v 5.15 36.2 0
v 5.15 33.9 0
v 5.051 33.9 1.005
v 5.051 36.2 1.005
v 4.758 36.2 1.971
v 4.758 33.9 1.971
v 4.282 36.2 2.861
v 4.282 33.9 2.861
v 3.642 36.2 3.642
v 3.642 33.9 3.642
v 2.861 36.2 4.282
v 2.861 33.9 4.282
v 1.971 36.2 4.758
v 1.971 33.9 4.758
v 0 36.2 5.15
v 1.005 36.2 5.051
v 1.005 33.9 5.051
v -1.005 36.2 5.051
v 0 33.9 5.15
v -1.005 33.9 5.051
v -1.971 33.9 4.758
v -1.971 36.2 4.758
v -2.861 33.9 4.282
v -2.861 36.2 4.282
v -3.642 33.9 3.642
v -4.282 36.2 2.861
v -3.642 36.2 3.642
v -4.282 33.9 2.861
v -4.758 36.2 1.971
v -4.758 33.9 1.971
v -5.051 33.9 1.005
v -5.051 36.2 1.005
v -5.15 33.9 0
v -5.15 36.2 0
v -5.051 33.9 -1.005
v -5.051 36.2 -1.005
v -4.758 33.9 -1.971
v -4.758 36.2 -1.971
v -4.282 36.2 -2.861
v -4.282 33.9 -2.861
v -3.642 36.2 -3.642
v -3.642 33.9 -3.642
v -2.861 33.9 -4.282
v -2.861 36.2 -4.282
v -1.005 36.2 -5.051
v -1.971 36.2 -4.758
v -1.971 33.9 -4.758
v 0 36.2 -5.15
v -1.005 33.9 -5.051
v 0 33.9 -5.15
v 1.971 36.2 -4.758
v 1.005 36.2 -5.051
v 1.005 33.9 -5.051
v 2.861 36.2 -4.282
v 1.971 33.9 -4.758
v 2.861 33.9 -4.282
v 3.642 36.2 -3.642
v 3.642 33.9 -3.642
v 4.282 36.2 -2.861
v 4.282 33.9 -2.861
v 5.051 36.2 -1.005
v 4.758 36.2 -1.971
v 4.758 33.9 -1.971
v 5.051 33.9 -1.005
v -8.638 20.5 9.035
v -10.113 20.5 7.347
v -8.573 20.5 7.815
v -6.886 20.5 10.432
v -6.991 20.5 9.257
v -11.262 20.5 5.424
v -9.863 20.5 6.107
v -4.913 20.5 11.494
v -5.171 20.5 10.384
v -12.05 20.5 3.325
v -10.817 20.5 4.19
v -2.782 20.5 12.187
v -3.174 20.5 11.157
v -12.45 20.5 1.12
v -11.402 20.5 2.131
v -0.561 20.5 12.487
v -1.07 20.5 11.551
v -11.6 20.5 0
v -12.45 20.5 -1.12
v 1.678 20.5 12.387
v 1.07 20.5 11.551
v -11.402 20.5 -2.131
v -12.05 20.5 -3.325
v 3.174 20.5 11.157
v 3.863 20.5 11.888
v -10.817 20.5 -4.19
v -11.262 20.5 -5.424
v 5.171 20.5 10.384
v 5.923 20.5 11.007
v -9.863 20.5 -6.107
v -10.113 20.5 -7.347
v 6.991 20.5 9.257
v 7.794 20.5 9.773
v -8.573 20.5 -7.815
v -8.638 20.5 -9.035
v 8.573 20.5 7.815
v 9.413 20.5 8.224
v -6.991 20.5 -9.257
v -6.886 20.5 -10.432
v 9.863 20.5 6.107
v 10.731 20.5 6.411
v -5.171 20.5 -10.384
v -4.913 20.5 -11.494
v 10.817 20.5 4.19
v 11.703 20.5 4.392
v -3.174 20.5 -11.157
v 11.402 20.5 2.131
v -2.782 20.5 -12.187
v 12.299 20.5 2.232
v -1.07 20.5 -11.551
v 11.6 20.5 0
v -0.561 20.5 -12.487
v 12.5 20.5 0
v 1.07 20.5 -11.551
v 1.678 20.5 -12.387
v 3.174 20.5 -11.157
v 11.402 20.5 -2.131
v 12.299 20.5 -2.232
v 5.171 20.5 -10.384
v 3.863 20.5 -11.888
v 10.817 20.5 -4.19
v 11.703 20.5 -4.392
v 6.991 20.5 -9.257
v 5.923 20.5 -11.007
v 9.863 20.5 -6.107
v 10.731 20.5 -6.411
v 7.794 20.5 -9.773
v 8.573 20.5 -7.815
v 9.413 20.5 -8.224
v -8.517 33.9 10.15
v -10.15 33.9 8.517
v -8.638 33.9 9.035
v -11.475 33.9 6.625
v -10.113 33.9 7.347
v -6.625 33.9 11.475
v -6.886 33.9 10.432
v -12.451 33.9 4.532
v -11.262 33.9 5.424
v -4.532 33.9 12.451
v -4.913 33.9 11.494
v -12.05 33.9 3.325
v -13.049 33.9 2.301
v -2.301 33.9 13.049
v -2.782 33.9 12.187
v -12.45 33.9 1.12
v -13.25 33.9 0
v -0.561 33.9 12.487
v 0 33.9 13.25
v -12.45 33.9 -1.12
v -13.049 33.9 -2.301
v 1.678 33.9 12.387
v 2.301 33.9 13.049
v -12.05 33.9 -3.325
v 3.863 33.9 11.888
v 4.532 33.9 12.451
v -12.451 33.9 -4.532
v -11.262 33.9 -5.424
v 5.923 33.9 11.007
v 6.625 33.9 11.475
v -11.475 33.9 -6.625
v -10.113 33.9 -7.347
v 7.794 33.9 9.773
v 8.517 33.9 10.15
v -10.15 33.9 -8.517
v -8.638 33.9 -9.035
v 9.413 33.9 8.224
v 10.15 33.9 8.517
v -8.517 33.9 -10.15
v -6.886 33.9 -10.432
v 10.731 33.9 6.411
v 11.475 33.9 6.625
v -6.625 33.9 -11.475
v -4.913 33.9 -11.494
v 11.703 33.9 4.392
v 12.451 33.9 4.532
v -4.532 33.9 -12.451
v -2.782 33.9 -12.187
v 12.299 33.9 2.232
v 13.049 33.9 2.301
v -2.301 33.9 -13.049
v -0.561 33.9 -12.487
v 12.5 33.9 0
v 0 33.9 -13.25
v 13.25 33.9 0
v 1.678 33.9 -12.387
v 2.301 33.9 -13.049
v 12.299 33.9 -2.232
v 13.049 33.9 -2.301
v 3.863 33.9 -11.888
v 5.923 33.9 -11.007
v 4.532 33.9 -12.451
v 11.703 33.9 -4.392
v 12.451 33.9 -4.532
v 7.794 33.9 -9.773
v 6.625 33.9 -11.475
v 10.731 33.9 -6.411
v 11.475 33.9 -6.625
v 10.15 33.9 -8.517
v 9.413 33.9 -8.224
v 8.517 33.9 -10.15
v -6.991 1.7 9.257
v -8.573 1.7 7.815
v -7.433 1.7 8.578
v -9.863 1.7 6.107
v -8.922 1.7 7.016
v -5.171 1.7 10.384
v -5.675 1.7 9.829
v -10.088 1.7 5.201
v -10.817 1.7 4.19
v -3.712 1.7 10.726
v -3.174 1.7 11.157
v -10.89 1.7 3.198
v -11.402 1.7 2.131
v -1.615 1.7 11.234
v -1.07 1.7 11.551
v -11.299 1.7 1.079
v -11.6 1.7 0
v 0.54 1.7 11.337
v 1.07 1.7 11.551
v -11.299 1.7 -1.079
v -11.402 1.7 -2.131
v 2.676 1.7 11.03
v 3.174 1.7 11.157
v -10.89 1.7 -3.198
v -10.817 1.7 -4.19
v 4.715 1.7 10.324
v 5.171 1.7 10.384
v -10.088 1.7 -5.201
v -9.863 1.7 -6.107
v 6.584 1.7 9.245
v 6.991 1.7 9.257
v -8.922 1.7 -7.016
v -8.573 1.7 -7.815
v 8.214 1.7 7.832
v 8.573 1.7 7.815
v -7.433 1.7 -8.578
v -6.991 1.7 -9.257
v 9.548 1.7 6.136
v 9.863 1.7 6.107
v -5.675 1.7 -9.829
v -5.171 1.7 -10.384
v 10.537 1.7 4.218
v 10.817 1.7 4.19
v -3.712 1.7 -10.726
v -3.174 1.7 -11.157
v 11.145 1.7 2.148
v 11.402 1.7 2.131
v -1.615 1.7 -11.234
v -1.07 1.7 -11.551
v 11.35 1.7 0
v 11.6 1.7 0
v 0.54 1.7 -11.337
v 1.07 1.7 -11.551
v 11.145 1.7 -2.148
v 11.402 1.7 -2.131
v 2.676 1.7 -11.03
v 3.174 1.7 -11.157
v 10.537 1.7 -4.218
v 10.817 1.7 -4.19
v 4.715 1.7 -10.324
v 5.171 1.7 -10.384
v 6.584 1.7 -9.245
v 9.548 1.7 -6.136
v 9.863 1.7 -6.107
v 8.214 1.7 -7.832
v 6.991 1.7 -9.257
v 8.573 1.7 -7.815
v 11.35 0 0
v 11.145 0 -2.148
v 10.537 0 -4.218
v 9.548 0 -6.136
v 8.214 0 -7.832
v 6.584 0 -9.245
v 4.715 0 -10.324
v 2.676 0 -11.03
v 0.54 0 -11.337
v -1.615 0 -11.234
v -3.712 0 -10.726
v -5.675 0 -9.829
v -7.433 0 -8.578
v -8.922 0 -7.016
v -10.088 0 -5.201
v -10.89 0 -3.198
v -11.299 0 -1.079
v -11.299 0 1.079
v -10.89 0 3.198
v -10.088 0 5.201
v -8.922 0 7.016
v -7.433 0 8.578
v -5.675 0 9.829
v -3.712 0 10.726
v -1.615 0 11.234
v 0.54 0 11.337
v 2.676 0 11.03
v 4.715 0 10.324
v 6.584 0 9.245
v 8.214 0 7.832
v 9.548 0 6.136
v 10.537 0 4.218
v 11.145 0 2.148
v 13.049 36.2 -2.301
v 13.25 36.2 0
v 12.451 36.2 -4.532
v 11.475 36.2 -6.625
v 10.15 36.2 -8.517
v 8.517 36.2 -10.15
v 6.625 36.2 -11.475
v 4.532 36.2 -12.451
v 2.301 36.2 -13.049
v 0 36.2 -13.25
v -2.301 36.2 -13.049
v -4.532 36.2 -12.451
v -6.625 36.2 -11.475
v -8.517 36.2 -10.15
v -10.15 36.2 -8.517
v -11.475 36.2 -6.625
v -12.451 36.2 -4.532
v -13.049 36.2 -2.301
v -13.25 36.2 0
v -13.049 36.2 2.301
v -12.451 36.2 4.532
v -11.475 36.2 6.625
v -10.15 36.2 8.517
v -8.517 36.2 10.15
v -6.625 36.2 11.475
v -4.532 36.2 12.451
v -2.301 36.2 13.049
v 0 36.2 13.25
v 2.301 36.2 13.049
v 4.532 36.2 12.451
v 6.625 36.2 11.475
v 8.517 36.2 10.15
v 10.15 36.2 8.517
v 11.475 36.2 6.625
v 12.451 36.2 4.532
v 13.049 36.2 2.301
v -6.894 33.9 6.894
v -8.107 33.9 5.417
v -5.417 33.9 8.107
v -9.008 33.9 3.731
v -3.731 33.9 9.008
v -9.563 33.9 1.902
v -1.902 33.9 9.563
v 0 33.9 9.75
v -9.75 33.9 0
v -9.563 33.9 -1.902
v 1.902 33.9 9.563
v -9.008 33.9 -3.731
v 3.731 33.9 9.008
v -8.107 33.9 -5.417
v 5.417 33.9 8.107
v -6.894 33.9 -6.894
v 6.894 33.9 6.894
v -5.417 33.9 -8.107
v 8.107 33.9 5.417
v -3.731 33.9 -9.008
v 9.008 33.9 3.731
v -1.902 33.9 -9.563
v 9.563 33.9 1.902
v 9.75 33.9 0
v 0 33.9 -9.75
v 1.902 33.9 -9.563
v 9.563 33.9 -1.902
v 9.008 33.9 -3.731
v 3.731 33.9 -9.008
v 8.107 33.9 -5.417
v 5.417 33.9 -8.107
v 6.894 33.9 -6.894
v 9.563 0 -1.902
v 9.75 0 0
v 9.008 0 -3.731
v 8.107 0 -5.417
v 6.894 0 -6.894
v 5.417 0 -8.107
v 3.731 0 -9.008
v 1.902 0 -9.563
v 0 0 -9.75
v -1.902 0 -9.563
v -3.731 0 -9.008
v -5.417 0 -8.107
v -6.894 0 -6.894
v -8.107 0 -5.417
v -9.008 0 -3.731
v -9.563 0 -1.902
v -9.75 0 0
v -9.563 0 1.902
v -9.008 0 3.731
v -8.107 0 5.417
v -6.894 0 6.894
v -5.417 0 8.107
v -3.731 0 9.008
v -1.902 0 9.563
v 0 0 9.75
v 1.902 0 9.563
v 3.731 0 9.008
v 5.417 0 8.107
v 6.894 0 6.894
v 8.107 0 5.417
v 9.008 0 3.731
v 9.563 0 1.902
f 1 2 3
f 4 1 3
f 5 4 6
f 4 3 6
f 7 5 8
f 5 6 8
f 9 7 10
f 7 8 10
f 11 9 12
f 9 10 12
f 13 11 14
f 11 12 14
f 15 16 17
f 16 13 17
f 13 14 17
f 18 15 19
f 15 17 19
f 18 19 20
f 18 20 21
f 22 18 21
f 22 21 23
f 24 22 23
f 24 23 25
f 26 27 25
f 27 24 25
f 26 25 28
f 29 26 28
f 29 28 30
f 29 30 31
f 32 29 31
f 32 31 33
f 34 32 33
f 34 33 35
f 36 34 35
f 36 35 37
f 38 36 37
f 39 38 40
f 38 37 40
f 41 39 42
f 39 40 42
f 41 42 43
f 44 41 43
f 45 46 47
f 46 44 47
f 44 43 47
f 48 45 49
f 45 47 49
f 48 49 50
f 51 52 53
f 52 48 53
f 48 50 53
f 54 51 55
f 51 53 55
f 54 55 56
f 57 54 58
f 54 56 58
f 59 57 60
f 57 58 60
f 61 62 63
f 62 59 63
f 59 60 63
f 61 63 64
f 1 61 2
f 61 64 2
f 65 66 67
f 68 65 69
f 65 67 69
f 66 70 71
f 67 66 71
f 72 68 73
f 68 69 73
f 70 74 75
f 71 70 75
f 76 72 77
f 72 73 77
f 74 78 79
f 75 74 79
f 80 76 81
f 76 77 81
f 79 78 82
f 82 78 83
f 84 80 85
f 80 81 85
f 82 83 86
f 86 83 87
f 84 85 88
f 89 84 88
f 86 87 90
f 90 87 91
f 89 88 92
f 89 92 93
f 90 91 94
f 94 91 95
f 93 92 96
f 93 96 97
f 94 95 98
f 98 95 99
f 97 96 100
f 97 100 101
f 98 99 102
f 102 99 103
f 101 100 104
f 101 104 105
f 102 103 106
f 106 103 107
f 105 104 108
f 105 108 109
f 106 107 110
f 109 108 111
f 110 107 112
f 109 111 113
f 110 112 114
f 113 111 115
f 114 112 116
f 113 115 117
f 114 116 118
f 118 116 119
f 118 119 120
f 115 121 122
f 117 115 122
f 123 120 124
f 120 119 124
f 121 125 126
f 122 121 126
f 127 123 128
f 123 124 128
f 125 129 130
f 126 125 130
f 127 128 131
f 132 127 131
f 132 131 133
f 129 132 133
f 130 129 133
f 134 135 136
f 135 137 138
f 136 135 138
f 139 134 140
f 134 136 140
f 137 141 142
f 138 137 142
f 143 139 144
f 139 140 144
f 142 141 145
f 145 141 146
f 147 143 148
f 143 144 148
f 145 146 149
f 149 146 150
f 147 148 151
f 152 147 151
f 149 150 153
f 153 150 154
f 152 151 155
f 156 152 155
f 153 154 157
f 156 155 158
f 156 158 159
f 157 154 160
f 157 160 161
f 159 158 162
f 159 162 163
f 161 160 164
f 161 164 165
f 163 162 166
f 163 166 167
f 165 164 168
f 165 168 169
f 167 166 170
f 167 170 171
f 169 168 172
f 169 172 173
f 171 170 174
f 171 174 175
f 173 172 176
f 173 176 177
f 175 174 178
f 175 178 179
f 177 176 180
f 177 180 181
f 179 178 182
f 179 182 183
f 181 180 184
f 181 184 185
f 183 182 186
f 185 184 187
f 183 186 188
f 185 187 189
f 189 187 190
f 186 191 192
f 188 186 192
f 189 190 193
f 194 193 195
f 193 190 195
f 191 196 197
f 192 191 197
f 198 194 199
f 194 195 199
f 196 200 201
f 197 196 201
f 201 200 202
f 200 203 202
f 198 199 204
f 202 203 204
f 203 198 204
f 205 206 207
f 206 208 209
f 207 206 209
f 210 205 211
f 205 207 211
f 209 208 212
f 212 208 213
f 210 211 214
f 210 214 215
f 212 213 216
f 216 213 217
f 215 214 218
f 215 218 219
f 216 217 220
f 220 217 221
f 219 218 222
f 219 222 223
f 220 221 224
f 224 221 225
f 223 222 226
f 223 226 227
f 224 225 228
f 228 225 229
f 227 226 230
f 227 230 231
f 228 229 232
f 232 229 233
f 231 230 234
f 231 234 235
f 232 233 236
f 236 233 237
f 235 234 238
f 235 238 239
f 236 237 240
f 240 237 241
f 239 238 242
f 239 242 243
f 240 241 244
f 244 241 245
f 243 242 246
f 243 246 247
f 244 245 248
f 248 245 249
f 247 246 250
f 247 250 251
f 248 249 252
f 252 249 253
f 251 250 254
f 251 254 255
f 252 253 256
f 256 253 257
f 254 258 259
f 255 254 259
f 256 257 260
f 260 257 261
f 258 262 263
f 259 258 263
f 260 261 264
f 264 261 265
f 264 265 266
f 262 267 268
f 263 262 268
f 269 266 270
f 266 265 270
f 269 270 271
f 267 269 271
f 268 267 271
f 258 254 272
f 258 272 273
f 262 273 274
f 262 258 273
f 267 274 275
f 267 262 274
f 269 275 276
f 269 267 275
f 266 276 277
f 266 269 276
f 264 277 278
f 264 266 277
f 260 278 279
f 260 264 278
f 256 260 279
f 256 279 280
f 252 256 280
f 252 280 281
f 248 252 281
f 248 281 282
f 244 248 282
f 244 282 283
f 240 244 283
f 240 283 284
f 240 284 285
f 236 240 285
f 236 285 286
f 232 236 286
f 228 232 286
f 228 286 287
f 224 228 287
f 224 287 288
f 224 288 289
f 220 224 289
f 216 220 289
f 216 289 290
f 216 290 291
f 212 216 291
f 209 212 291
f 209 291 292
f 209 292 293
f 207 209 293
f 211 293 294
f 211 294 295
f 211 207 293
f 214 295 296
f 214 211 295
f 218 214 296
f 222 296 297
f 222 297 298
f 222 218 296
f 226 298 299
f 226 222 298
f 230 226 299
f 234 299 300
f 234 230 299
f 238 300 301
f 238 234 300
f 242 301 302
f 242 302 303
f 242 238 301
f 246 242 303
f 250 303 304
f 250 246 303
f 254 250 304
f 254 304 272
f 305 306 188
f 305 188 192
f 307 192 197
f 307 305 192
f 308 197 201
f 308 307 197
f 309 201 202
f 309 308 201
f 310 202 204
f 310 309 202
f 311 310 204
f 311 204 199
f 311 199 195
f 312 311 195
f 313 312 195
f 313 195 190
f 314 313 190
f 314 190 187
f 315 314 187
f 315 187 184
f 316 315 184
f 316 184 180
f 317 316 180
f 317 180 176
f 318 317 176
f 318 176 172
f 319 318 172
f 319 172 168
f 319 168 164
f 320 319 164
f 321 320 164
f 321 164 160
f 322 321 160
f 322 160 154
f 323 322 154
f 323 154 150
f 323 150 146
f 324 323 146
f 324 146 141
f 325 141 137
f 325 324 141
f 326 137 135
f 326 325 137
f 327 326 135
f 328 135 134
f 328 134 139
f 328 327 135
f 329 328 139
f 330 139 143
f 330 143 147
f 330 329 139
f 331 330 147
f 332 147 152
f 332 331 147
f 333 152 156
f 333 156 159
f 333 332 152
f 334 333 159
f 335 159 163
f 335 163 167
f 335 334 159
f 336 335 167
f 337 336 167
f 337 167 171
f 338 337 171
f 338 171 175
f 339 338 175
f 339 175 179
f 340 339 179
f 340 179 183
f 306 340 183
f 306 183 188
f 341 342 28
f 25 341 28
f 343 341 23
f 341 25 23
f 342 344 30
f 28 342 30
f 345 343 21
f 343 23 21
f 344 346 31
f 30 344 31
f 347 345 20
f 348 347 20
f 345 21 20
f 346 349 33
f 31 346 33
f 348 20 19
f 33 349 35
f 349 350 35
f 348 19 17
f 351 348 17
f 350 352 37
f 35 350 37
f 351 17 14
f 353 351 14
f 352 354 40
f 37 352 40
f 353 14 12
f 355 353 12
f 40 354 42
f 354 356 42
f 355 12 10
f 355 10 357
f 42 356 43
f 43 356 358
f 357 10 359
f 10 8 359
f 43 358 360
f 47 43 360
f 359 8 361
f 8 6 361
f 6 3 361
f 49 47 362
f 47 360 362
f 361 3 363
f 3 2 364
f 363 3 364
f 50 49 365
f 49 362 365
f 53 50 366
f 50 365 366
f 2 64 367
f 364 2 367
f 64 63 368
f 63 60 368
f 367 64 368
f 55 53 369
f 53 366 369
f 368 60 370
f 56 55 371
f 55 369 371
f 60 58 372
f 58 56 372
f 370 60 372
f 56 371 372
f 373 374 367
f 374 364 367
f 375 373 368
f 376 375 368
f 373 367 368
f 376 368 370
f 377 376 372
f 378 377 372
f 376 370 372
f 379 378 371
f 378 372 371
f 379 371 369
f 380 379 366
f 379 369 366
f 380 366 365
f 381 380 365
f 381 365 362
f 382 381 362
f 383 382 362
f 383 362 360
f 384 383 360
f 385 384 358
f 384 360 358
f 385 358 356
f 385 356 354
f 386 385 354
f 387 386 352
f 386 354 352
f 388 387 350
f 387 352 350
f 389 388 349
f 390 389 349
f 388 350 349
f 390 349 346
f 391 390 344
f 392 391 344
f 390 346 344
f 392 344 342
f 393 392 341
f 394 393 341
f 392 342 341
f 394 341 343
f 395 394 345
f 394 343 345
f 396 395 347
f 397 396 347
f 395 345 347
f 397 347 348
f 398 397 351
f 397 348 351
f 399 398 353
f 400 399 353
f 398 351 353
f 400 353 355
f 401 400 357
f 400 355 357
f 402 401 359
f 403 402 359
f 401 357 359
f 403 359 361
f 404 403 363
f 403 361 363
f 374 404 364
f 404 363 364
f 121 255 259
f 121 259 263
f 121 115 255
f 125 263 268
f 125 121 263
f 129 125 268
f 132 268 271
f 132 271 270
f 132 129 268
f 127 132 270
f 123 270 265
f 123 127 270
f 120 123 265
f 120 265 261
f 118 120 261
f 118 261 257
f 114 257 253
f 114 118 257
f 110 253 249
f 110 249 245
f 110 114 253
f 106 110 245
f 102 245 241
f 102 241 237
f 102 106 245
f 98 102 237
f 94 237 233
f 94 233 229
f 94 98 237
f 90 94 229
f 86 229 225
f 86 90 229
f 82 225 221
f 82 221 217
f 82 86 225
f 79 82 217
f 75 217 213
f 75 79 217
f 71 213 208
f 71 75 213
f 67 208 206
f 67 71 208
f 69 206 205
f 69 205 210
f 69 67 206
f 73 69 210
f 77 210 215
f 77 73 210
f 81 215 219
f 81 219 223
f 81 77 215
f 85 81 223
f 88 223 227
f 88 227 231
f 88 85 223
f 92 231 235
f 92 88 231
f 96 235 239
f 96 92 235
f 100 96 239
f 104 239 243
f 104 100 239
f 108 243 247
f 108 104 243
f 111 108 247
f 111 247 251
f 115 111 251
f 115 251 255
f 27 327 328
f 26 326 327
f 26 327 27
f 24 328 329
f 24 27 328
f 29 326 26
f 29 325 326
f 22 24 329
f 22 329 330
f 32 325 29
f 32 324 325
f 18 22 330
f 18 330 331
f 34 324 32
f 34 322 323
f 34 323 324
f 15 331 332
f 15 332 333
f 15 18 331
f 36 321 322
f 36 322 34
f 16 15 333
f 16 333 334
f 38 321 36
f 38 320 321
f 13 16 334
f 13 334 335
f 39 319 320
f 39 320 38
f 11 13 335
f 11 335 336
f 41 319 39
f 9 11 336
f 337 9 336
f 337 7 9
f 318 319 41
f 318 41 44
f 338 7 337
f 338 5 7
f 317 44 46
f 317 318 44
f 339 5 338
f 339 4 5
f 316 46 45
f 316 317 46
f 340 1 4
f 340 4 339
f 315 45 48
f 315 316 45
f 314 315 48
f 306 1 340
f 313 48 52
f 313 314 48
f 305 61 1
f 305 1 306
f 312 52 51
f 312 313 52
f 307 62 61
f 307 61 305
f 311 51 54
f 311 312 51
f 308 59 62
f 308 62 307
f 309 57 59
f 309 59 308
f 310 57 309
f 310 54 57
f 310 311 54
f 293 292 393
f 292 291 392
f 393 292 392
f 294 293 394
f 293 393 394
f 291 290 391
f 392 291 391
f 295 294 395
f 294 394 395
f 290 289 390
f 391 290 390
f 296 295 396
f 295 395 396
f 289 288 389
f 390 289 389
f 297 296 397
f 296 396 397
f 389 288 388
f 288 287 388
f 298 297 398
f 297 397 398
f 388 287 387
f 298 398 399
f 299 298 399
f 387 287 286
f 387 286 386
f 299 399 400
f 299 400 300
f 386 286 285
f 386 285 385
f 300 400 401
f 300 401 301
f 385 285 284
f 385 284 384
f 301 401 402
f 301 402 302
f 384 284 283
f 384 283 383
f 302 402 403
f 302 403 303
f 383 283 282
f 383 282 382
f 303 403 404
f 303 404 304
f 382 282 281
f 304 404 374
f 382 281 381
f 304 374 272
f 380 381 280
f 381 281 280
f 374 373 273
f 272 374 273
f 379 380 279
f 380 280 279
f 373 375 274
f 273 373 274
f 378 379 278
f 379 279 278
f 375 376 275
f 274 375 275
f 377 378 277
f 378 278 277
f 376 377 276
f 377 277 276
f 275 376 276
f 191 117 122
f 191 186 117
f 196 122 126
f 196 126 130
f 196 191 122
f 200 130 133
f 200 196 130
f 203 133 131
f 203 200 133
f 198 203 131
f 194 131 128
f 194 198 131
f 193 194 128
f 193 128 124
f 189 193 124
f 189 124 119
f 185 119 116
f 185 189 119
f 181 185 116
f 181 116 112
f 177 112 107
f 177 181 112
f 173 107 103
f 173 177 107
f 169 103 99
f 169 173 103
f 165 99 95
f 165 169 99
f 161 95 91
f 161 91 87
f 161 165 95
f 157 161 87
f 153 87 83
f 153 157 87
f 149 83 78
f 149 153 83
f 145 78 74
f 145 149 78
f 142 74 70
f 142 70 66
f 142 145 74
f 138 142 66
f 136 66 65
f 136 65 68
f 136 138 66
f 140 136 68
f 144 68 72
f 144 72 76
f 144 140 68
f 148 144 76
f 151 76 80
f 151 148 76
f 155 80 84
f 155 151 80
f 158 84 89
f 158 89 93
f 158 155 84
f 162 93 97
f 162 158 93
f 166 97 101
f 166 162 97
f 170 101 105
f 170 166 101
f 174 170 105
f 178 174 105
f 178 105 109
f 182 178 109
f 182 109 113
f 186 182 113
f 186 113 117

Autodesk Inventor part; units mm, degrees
ref_plane "YZ Plane" through (0, 0, 0) normal (1, 0, 0) x (0, 1, 0)
ref_plane "XZ Plane" through (0, 0, 0) normal (0, 1, 0) x (-1, 0, 0)
ref_plane "XY Plane" through (0, 0, 0) normal (0, 0, 1) x (1, 0, 0)
sketch "Sketch6" plane through (0, 0, 0) normal (0, 0, 1) x (1, 0, 0)
  line L0 (11.35, 0) -> (11.35, 1.7)
  line L1 (11.35, 1.7) -> (11.6, 1.7)
  line L2 (11.6, 1.7) -> (11.6, 20.5)
  line L3 (11.6, 20.5) -> (12.5, 20.5)
  line L4 (12.5, 20.5) -> (12.5, 33.9)
  line L5 (12.5, 33.9) -> (13.25, 33.9)
  line L6 (13.25, 33.9) -> (13.25, 36.2)
  line L7 (11.35, 0) -> (9.75, 0)
  line L8 (9.75, 0) -> (9.75, 33.9)
  line L9 (13.25, 36.2) -> (5.15, 36.2)
  line L10 (5.15, 36.2) -> (5.15, 33.9)
  line L11 (5.15, 33.9) -> (9.75, 33.9)
  line L12 (0, -7.24) -> (0, 43.44) construction
  point P0 (0, 0)
  dimension "d7" = 11.35
  dimension "d8" = 1.7
  dimension "d9" = 11.6
  dimension "d11" = 12.5
  dimension "d13" = 13.25
  dimension "d14" = 2.3
  dimension "d16" = 1.6
  dimension "d17" = 8.1
  dimension "d18" = 0.25
  dimension "d19" = 15.7
  dimension "d20" = 36.2
revolve "Revolution1" add sketch "Sketch6" angle 360 about axis through (0, -10, 0) along (0, 1, 0)
properties part number "Eye-Piece"
